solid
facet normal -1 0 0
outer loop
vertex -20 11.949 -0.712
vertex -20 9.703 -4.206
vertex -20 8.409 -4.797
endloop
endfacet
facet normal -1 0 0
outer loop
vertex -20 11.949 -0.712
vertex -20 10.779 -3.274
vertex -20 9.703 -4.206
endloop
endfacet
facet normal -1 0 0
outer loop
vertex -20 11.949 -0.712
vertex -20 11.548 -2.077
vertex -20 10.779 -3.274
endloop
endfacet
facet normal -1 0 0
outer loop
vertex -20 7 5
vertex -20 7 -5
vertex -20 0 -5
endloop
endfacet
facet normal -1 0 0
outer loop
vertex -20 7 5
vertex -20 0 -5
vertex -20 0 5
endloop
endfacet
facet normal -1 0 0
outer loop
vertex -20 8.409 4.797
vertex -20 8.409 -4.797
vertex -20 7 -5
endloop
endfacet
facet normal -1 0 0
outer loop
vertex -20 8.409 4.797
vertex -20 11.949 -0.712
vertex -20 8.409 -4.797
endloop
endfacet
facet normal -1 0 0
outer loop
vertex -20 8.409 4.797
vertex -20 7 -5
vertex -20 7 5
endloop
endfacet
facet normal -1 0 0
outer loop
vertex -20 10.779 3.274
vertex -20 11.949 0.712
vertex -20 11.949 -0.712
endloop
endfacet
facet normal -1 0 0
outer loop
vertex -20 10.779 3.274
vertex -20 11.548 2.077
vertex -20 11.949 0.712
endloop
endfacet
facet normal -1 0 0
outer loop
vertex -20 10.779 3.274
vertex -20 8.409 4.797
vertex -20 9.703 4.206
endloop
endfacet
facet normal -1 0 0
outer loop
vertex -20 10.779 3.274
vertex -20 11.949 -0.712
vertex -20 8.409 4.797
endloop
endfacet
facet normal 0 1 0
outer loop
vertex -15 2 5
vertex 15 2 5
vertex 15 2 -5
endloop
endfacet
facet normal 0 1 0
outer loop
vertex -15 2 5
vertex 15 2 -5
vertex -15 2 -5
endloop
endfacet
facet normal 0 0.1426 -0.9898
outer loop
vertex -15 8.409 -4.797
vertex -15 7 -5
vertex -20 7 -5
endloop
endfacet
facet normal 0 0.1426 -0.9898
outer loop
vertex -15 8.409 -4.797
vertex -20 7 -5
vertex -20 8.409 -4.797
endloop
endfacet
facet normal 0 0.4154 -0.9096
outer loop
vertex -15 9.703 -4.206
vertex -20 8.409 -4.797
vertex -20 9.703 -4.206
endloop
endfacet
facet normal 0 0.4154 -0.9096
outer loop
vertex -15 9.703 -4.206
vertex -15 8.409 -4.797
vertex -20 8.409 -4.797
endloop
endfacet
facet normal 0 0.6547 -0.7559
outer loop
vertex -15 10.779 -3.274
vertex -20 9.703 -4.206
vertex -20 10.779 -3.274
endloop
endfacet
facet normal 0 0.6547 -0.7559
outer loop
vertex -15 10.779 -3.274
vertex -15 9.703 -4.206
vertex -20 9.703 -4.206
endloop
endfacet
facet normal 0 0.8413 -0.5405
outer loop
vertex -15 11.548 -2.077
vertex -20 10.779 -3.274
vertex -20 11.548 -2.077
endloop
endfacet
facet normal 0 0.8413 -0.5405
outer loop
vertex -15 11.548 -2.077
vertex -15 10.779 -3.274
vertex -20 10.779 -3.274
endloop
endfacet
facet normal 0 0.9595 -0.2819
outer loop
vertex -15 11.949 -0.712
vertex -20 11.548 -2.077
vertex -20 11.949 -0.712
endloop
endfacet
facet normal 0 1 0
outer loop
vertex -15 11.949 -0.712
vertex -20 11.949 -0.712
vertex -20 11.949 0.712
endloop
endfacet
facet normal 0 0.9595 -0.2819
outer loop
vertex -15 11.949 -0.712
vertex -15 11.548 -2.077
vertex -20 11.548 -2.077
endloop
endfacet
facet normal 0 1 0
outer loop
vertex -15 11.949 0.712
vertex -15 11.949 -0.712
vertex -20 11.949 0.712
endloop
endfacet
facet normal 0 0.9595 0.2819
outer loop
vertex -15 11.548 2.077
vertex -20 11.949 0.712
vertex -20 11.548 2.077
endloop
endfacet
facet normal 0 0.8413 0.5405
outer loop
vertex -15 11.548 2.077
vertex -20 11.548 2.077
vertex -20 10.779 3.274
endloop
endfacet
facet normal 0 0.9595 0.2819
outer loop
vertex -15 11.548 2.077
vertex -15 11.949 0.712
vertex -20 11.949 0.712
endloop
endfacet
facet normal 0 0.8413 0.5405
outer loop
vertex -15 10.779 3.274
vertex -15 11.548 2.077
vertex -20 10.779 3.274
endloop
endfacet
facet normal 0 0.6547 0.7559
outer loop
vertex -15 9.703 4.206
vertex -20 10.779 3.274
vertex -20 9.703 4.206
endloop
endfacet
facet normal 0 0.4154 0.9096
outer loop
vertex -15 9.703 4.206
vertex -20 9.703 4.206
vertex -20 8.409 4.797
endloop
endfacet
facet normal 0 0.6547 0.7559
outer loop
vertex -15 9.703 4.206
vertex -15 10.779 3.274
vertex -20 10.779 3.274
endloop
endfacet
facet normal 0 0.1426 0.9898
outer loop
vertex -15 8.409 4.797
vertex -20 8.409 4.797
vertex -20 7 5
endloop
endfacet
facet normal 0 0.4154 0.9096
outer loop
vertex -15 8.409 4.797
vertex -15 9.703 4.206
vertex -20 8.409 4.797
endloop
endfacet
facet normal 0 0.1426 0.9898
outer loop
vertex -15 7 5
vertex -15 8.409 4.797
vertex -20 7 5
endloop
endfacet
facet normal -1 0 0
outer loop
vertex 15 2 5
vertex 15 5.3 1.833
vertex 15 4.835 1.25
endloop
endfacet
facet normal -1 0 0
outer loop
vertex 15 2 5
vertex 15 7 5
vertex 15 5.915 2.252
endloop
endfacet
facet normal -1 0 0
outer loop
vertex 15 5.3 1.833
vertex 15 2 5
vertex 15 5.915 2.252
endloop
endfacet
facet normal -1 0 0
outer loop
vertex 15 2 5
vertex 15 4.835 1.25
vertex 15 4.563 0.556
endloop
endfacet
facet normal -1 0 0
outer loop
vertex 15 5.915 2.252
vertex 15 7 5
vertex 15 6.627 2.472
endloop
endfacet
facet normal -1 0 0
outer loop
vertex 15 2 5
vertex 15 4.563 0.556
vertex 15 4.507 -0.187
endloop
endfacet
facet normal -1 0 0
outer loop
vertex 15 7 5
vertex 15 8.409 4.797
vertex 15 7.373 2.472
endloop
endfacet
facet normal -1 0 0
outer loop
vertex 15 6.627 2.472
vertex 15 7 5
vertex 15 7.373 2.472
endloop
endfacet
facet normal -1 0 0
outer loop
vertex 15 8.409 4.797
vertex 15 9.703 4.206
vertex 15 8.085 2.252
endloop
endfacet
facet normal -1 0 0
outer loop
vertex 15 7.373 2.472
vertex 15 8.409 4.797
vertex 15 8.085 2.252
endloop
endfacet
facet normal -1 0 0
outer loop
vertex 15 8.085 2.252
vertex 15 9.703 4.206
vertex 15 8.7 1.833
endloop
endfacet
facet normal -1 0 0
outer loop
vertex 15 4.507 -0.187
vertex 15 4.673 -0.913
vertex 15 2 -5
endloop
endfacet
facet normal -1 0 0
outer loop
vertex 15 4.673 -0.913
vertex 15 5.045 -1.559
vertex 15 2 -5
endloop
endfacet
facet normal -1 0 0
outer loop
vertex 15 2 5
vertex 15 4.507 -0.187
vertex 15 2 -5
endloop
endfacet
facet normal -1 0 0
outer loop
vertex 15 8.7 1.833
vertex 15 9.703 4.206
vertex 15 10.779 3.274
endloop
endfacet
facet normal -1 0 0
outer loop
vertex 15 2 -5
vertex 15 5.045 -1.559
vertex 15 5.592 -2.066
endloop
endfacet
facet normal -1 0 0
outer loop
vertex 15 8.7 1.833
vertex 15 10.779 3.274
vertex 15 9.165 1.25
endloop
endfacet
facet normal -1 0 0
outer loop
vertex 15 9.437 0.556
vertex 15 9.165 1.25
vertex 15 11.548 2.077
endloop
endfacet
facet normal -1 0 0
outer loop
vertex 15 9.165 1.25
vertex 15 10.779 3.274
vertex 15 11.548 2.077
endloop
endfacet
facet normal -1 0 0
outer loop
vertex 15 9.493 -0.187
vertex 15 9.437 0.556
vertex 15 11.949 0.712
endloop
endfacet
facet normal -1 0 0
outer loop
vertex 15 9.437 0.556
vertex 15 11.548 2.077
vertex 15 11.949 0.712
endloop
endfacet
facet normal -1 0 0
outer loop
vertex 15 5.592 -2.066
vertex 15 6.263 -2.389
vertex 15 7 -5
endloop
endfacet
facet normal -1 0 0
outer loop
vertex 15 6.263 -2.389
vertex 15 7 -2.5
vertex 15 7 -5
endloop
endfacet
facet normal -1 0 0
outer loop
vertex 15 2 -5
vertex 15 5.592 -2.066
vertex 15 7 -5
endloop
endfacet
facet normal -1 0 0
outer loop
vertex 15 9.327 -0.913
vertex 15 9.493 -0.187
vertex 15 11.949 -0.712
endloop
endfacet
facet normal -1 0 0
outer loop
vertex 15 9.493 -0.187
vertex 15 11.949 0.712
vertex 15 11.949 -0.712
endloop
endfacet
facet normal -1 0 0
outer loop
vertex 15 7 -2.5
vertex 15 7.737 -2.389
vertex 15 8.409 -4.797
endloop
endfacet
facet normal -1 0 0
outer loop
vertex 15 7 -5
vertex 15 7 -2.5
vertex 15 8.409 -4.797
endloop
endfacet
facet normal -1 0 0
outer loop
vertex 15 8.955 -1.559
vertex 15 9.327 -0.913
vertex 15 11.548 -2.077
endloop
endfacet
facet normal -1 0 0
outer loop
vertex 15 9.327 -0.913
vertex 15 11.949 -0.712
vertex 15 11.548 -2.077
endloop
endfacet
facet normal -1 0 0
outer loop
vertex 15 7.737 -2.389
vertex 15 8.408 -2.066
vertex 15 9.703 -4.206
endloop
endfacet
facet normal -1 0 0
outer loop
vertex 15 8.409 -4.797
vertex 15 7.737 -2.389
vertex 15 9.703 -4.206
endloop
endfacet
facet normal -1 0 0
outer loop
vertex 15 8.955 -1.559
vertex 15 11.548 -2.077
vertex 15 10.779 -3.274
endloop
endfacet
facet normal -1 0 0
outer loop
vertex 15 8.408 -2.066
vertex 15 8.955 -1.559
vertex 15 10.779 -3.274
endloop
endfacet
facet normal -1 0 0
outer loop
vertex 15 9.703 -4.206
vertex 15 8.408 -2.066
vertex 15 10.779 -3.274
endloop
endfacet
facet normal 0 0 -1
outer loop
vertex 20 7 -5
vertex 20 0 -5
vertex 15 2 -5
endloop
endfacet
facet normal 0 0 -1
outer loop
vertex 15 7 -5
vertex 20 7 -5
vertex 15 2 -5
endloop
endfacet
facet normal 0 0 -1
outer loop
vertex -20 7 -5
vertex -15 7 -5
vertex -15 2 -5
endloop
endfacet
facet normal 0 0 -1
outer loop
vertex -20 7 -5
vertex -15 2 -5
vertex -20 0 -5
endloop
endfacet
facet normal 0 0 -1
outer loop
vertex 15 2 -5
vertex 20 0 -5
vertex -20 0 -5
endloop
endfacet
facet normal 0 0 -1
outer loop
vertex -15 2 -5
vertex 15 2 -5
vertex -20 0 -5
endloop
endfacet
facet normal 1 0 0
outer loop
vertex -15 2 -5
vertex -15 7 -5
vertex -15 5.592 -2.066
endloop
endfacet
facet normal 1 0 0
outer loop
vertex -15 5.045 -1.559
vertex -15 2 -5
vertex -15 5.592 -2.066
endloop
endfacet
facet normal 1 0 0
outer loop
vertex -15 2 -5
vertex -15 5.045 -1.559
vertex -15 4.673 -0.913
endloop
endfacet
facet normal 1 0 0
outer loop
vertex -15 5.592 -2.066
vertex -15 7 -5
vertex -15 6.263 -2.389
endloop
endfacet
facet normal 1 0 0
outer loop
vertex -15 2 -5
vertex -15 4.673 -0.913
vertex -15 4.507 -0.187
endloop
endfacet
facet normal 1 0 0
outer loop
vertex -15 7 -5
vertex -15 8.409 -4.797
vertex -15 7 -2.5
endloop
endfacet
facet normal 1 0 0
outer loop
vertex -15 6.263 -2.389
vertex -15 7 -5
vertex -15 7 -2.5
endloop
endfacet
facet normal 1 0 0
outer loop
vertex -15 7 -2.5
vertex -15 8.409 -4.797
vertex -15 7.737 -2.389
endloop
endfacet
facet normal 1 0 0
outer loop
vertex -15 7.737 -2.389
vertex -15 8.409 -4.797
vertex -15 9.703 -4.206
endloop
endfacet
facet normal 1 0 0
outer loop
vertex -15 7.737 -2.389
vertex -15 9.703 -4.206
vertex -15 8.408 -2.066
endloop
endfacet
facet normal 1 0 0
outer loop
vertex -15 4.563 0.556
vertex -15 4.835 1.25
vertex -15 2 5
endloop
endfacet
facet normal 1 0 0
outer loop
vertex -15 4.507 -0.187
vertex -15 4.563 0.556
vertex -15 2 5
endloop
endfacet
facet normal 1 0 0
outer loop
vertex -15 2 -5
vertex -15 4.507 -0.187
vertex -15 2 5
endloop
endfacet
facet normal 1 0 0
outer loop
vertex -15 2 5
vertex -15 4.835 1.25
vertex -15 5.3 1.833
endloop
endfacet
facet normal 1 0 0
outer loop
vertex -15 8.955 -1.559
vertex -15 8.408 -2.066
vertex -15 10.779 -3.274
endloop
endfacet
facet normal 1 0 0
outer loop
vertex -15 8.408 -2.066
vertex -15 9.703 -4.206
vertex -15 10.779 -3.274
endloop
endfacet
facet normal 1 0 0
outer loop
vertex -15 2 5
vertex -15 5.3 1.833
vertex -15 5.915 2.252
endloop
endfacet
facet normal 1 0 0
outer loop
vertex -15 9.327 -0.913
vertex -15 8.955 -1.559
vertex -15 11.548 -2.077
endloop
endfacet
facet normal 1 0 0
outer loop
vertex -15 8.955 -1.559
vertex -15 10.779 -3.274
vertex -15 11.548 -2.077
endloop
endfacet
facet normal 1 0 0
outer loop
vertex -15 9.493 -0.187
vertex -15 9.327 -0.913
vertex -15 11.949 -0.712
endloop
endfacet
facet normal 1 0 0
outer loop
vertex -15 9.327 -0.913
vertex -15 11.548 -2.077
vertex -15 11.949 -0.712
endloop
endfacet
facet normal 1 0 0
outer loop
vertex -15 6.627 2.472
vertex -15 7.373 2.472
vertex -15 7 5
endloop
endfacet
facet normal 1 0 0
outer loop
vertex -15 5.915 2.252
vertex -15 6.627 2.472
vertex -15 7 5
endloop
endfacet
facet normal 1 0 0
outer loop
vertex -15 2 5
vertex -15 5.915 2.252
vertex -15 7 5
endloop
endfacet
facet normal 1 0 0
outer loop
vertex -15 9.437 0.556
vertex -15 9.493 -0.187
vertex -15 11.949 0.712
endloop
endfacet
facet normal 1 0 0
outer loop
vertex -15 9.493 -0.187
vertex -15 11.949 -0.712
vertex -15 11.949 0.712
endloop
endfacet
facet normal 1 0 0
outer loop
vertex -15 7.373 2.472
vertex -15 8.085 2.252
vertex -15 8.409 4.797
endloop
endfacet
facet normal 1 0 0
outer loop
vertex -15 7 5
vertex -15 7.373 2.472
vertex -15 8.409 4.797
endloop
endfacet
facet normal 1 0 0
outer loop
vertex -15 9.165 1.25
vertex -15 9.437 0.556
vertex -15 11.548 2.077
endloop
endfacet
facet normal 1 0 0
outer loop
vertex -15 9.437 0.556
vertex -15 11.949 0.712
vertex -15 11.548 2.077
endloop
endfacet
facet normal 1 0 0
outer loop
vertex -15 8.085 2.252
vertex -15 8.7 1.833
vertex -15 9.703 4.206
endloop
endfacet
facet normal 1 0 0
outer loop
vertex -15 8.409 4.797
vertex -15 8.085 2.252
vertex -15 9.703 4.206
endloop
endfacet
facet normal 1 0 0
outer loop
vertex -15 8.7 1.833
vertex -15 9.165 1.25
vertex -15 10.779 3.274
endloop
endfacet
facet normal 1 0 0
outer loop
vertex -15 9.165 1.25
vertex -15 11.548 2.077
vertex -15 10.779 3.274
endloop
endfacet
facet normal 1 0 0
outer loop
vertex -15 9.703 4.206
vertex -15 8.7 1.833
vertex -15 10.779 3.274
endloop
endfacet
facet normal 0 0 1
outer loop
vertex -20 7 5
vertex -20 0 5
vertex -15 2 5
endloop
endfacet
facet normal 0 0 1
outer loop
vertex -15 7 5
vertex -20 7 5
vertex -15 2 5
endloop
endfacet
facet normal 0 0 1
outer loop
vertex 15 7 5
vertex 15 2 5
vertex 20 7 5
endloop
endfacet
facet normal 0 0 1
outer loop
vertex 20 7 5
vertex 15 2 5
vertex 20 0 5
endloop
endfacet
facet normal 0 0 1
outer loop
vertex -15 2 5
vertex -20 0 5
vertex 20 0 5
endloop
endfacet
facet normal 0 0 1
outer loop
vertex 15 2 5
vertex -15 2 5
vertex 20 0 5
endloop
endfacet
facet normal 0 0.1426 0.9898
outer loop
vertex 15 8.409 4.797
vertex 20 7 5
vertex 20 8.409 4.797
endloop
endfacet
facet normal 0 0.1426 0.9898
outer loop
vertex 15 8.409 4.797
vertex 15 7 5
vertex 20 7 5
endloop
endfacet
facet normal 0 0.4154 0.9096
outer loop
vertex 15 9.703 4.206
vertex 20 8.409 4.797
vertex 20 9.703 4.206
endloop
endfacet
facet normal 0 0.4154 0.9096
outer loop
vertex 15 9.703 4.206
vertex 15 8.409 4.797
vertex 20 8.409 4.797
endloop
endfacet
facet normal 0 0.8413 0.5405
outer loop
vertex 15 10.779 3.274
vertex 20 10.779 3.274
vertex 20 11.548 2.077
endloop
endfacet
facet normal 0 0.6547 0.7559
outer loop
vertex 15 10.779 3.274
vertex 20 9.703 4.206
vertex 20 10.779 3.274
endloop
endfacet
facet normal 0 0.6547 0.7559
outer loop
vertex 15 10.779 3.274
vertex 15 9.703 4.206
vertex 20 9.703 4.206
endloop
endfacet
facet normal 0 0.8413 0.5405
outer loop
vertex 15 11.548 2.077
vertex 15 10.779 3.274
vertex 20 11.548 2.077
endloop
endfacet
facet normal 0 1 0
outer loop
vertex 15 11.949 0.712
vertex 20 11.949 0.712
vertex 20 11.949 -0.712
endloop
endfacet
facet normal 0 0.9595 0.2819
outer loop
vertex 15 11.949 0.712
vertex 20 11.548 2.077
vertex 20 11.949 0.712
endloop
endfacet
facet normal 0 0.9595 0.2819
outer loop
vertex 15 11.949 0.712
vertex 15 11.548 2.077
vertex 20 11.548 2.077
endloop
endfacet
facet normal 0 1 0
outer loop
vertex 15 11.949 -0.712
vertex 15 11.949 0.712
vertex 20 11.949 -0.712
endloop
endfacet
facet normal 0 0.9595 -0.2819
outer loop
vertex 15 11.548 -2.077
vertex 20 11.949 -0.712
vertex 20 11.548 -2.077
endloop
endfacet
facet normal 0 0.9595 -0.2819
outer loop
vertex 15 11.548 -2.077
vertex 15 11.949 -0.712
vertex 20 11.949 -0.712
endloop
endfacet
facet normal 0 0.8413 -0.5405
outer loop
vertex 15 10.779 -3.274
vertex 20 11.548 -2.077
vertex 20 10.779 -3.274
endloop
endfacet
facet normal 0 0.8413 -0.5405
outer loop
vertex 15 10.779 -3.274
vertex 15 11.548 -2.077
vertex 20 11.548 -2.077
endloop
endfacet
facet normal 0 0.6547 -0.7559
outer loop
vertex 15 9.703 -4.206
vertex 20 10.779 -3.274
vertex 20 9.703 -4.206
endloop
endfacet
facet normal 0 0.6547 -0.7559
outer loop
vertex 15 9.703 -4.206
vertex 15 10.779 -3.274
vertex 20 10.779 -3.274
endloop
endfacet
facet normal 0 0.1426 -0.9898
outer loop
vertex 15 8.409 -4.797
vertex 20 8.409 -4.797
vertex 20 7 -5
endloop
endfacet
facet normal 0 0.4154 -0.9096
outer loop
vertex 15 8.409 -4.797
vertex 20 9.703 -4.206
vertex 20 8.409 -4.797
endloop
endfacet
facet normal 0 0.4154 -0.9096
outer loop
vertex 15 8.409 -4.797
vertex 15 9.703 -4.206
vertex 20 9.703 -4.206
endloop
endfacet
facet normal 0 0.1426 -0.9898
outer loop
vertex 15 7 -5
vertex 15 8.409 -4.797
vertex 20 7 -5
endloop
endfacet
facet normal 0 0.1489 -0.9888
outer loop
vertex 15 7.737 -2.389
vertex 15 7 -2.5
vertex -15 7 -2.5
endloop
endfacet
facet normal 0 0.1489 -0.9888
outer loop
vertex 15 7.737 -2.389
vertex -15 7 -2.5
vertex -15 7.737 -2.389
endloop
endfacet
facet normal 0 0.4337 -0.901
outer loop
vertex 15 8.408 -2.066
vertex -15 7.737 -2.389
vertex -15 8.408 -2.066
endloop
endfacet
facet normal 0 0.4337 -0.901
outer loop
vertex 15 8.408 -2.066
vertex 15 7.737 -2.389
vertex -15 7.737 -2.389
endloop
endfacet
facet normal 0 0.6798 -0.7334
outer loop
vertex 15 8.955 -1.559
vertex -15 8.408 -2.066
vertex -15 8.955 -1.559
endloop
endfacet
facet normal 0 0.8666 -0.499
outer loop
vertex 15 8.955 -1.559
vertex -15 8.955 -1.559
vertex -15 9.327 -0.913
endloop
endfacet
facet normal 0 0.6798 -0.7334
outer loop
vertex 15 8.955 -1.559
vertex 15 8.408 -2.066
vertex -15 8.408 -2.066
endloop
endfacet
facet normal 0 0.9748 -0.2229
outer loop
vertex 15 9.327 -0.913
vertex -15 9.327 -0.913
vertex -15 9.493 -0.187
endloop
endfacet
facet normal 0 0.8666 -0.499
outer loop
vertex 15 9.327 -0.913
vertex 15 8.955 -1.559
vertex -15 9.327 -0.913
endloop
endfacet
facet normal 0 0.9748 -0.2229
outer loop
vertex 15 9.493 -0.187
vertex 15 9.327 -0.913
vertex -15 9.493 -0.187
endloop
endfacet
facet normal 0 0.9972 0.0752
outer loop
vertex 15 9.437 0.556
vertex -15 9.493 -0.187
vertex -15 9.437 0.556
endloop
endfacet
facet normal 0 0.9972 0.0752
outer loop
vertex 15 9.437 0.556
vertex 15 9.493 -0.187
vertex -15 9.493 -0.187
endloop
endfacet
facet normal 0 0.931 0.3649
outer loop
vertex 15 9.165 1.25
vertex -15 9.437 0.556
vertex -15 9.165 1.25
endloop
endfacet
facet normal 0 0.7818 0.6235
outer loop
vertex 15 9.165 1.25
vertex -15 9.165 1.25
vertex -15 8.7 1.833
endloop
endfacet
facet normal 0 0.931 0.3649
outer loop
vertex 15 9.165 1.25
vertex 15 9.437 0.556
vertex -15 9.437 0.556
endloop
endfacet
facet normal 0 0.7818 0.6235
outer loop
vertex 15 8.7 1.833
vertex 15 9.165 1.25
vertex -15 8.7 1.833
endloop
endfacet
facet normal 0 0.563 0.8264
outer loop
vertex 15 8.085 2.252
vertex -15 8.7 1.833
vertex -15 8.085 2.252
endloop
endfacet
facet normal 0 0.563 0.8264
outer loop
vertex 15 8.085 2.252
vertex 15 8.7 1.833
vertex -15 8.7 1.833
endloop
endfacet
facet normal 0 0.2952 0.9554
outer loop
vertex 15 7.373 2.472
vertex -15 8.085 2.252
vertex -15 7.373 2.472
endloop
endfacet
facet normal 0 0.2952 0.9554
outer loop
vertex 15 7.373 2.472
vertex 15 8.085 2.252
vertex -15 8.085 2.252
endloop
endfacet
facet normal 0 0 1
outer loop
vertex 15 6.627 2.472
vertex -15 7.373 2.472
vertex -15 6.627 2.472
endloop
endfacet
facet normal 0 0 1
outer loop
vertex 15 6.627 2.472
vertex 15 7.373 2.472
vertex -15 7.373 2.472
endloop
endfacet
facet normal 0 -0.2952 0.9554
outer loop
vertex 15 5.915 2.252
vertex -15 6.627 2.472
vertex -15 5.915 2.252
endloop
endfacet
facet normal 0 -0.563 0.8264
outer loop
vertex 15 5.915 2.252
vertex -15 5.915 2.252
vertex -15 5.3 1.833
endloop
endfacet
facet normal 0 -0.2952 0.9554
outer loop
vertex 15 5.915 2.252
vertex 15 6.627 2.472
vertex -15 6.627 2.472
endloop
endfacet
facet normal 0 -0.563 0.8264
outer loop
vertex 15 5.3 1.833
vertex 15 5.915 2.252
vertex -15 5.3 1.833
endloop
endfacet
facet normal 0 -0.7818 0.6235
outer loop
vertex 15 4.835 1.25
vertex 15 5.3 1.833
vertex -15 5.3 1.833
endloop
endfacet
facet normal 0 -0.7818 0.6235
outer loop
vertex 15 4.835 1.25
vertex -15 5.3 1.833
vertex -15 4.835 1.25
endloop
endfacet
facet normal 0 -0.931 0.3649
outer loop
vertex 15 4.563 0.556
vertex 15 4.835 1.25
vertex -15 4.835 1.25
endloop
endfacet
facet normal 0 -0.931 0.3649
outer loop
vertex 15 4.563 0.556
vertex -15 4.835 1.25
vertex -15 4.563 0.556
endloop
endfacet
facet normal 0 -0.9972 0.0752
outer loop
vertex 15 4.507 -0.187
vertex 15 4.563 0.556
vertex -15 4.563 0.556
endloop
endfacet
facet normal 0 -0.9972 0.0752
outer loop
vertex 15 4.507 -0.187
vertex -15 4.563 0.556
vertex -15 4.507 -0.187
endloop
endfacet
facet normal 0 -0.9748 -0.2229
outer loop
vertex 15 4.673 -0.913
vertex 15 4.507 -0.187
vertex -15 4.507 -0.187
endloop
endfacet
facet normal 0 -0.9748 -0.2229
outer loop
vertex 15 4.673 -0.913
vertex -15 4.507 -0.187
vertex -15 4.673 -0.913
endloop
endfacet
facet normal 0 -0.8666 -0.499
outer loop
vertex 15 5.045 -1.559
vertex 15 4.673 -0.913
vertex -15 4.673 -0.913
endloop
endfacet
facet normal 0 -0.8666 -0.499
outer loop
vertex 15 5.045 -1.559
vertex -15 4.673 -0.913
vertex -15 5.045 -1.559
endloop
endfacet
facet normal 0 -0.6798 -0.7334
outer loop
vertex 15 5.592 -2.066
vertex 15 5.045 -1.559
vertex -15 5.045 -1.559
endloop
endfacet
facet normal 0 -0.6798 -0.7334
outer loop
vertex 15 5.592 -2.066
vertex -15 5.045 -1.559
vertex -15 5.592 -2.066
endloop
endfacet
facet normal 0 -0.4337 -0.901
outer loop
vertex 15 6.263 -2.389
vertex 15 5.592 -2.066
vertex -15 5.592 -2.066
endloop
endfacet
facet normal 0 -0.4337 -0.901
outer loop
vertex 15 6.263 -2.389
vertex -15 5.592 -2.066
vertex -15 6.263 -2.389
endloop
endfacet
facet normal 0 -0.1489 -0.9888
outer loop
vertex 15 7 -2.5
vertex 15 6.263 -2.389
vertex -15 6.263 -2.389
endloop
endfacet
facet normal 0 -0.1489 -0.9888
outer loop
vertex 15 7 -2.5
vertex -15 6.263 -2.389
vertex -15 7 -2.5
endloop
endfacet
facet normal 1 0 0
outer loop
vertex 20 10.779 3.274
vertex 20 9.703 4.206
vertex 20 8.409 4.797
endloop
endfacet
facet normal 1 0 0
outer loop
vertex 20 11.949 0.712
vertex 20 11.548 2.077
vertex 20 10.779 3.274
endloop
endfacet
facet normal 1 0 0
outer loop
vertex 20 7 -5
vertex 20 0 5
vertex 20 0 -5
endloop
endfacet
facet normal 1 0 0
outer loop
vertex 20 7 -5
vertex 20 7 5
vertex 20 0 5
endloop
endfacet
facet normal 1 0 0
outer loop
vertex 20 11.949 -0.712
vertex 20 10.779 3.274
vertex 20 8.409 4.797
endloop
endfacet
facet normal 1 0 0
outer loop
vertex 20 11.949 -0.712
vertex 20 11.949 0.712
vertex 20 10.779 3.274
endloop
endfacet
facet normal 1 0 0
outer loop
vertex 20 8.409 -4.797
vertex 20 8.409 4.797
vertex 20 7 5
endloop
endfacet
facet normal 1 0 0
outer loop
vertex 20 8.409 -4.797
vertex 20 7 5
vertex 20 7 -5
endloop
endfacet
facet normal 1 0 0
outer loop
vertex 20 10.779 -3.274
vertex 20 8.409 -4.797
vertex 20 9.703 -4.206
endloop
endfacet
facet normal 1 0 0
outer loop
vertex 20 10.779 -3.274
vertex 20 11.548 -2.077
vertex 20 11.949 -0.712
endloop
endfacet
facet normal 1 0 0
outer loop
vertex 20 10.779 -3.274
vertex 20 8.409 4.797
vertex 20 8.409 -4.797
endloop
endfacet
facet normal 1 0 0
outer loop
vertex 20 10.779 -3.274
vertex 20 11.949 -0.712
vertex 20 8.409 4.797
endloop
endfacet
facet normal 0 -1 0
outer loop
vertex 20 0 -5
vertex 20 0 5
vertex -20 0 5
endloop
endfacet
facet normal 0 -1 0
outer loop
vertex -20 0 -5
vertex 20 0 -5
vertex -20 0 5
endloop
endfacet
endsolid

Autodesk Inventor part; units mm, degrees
ref_plane "YZ Plane" through (0, 0, 0) normal (1, 0, 0) x (0, 1, 0)
ref_plane "XZ Plane" through (0, 0, 0) normal (0, 1, 0) x (-1, 0, 0)
ref_plane "XY Plane" through (0, 0, 0) normal (0, 0, 1) x (1, 0, 0)
sketch "スケッチ1" plane through (0, 0, 0) normal (0, 1, 0) x (-1, 0, 0)
  line L0 (-15, -5) -> (15, -5)
  line L1 (15, -5) -> (15, 5)
  line L2 (15, 5) -> (-15, 5)
  line L3 (-15, 5) -> (-15, -5)
  line L4 (-15, -5) -> (15, 5) construction
  line L5 (15, -5) -> (-15, 5) construction
  point P0 (0, 0)
  dimension "d0" = 30
  dimension "d1" = 10
extrude "押し出し1" add sketch "スケッチ1" along normal blind 2
sketch "スケッチ2" plane through (15, 0, 5) normal (1, 0, 0) x (0, 0, -1)
  circle A0 centre (5, 7) radius 2.5
  circle A1 centre (5, 7) radius 5
  line L0 (0, 2) -> (10, 2) projected
  line L1 (10, 0) -> (10, 2) projected
  line L2 (0, 0) -> (0, 2) projected
  line L3 (0, 2) -> (0, 7)
  line L4 (10, 2) -> (10, 7)
  line L5 (0, 0) -> (10, 0) projected
  point P0 (5, 0)
  dimension "d4" = 5
extrude "押し出し2" add sketch "スケッチ2" along normal blind 5
mirror "ミラー1" about plane through (0, 0, 0) normal (1, 0, 0) of "押し出し2"
sketch "スケッチ3" plane through (20, 0, 5) normal (1, 0, 0) x (0, 0, -1)
  circle A0 centre (5, 7) radius 2.5 projected
  point P0 (5, 0)
extrude "押し出し3" add sketch "スケッチ3" against normal up to surface (40 mm away)
properties part number "arm_base"
